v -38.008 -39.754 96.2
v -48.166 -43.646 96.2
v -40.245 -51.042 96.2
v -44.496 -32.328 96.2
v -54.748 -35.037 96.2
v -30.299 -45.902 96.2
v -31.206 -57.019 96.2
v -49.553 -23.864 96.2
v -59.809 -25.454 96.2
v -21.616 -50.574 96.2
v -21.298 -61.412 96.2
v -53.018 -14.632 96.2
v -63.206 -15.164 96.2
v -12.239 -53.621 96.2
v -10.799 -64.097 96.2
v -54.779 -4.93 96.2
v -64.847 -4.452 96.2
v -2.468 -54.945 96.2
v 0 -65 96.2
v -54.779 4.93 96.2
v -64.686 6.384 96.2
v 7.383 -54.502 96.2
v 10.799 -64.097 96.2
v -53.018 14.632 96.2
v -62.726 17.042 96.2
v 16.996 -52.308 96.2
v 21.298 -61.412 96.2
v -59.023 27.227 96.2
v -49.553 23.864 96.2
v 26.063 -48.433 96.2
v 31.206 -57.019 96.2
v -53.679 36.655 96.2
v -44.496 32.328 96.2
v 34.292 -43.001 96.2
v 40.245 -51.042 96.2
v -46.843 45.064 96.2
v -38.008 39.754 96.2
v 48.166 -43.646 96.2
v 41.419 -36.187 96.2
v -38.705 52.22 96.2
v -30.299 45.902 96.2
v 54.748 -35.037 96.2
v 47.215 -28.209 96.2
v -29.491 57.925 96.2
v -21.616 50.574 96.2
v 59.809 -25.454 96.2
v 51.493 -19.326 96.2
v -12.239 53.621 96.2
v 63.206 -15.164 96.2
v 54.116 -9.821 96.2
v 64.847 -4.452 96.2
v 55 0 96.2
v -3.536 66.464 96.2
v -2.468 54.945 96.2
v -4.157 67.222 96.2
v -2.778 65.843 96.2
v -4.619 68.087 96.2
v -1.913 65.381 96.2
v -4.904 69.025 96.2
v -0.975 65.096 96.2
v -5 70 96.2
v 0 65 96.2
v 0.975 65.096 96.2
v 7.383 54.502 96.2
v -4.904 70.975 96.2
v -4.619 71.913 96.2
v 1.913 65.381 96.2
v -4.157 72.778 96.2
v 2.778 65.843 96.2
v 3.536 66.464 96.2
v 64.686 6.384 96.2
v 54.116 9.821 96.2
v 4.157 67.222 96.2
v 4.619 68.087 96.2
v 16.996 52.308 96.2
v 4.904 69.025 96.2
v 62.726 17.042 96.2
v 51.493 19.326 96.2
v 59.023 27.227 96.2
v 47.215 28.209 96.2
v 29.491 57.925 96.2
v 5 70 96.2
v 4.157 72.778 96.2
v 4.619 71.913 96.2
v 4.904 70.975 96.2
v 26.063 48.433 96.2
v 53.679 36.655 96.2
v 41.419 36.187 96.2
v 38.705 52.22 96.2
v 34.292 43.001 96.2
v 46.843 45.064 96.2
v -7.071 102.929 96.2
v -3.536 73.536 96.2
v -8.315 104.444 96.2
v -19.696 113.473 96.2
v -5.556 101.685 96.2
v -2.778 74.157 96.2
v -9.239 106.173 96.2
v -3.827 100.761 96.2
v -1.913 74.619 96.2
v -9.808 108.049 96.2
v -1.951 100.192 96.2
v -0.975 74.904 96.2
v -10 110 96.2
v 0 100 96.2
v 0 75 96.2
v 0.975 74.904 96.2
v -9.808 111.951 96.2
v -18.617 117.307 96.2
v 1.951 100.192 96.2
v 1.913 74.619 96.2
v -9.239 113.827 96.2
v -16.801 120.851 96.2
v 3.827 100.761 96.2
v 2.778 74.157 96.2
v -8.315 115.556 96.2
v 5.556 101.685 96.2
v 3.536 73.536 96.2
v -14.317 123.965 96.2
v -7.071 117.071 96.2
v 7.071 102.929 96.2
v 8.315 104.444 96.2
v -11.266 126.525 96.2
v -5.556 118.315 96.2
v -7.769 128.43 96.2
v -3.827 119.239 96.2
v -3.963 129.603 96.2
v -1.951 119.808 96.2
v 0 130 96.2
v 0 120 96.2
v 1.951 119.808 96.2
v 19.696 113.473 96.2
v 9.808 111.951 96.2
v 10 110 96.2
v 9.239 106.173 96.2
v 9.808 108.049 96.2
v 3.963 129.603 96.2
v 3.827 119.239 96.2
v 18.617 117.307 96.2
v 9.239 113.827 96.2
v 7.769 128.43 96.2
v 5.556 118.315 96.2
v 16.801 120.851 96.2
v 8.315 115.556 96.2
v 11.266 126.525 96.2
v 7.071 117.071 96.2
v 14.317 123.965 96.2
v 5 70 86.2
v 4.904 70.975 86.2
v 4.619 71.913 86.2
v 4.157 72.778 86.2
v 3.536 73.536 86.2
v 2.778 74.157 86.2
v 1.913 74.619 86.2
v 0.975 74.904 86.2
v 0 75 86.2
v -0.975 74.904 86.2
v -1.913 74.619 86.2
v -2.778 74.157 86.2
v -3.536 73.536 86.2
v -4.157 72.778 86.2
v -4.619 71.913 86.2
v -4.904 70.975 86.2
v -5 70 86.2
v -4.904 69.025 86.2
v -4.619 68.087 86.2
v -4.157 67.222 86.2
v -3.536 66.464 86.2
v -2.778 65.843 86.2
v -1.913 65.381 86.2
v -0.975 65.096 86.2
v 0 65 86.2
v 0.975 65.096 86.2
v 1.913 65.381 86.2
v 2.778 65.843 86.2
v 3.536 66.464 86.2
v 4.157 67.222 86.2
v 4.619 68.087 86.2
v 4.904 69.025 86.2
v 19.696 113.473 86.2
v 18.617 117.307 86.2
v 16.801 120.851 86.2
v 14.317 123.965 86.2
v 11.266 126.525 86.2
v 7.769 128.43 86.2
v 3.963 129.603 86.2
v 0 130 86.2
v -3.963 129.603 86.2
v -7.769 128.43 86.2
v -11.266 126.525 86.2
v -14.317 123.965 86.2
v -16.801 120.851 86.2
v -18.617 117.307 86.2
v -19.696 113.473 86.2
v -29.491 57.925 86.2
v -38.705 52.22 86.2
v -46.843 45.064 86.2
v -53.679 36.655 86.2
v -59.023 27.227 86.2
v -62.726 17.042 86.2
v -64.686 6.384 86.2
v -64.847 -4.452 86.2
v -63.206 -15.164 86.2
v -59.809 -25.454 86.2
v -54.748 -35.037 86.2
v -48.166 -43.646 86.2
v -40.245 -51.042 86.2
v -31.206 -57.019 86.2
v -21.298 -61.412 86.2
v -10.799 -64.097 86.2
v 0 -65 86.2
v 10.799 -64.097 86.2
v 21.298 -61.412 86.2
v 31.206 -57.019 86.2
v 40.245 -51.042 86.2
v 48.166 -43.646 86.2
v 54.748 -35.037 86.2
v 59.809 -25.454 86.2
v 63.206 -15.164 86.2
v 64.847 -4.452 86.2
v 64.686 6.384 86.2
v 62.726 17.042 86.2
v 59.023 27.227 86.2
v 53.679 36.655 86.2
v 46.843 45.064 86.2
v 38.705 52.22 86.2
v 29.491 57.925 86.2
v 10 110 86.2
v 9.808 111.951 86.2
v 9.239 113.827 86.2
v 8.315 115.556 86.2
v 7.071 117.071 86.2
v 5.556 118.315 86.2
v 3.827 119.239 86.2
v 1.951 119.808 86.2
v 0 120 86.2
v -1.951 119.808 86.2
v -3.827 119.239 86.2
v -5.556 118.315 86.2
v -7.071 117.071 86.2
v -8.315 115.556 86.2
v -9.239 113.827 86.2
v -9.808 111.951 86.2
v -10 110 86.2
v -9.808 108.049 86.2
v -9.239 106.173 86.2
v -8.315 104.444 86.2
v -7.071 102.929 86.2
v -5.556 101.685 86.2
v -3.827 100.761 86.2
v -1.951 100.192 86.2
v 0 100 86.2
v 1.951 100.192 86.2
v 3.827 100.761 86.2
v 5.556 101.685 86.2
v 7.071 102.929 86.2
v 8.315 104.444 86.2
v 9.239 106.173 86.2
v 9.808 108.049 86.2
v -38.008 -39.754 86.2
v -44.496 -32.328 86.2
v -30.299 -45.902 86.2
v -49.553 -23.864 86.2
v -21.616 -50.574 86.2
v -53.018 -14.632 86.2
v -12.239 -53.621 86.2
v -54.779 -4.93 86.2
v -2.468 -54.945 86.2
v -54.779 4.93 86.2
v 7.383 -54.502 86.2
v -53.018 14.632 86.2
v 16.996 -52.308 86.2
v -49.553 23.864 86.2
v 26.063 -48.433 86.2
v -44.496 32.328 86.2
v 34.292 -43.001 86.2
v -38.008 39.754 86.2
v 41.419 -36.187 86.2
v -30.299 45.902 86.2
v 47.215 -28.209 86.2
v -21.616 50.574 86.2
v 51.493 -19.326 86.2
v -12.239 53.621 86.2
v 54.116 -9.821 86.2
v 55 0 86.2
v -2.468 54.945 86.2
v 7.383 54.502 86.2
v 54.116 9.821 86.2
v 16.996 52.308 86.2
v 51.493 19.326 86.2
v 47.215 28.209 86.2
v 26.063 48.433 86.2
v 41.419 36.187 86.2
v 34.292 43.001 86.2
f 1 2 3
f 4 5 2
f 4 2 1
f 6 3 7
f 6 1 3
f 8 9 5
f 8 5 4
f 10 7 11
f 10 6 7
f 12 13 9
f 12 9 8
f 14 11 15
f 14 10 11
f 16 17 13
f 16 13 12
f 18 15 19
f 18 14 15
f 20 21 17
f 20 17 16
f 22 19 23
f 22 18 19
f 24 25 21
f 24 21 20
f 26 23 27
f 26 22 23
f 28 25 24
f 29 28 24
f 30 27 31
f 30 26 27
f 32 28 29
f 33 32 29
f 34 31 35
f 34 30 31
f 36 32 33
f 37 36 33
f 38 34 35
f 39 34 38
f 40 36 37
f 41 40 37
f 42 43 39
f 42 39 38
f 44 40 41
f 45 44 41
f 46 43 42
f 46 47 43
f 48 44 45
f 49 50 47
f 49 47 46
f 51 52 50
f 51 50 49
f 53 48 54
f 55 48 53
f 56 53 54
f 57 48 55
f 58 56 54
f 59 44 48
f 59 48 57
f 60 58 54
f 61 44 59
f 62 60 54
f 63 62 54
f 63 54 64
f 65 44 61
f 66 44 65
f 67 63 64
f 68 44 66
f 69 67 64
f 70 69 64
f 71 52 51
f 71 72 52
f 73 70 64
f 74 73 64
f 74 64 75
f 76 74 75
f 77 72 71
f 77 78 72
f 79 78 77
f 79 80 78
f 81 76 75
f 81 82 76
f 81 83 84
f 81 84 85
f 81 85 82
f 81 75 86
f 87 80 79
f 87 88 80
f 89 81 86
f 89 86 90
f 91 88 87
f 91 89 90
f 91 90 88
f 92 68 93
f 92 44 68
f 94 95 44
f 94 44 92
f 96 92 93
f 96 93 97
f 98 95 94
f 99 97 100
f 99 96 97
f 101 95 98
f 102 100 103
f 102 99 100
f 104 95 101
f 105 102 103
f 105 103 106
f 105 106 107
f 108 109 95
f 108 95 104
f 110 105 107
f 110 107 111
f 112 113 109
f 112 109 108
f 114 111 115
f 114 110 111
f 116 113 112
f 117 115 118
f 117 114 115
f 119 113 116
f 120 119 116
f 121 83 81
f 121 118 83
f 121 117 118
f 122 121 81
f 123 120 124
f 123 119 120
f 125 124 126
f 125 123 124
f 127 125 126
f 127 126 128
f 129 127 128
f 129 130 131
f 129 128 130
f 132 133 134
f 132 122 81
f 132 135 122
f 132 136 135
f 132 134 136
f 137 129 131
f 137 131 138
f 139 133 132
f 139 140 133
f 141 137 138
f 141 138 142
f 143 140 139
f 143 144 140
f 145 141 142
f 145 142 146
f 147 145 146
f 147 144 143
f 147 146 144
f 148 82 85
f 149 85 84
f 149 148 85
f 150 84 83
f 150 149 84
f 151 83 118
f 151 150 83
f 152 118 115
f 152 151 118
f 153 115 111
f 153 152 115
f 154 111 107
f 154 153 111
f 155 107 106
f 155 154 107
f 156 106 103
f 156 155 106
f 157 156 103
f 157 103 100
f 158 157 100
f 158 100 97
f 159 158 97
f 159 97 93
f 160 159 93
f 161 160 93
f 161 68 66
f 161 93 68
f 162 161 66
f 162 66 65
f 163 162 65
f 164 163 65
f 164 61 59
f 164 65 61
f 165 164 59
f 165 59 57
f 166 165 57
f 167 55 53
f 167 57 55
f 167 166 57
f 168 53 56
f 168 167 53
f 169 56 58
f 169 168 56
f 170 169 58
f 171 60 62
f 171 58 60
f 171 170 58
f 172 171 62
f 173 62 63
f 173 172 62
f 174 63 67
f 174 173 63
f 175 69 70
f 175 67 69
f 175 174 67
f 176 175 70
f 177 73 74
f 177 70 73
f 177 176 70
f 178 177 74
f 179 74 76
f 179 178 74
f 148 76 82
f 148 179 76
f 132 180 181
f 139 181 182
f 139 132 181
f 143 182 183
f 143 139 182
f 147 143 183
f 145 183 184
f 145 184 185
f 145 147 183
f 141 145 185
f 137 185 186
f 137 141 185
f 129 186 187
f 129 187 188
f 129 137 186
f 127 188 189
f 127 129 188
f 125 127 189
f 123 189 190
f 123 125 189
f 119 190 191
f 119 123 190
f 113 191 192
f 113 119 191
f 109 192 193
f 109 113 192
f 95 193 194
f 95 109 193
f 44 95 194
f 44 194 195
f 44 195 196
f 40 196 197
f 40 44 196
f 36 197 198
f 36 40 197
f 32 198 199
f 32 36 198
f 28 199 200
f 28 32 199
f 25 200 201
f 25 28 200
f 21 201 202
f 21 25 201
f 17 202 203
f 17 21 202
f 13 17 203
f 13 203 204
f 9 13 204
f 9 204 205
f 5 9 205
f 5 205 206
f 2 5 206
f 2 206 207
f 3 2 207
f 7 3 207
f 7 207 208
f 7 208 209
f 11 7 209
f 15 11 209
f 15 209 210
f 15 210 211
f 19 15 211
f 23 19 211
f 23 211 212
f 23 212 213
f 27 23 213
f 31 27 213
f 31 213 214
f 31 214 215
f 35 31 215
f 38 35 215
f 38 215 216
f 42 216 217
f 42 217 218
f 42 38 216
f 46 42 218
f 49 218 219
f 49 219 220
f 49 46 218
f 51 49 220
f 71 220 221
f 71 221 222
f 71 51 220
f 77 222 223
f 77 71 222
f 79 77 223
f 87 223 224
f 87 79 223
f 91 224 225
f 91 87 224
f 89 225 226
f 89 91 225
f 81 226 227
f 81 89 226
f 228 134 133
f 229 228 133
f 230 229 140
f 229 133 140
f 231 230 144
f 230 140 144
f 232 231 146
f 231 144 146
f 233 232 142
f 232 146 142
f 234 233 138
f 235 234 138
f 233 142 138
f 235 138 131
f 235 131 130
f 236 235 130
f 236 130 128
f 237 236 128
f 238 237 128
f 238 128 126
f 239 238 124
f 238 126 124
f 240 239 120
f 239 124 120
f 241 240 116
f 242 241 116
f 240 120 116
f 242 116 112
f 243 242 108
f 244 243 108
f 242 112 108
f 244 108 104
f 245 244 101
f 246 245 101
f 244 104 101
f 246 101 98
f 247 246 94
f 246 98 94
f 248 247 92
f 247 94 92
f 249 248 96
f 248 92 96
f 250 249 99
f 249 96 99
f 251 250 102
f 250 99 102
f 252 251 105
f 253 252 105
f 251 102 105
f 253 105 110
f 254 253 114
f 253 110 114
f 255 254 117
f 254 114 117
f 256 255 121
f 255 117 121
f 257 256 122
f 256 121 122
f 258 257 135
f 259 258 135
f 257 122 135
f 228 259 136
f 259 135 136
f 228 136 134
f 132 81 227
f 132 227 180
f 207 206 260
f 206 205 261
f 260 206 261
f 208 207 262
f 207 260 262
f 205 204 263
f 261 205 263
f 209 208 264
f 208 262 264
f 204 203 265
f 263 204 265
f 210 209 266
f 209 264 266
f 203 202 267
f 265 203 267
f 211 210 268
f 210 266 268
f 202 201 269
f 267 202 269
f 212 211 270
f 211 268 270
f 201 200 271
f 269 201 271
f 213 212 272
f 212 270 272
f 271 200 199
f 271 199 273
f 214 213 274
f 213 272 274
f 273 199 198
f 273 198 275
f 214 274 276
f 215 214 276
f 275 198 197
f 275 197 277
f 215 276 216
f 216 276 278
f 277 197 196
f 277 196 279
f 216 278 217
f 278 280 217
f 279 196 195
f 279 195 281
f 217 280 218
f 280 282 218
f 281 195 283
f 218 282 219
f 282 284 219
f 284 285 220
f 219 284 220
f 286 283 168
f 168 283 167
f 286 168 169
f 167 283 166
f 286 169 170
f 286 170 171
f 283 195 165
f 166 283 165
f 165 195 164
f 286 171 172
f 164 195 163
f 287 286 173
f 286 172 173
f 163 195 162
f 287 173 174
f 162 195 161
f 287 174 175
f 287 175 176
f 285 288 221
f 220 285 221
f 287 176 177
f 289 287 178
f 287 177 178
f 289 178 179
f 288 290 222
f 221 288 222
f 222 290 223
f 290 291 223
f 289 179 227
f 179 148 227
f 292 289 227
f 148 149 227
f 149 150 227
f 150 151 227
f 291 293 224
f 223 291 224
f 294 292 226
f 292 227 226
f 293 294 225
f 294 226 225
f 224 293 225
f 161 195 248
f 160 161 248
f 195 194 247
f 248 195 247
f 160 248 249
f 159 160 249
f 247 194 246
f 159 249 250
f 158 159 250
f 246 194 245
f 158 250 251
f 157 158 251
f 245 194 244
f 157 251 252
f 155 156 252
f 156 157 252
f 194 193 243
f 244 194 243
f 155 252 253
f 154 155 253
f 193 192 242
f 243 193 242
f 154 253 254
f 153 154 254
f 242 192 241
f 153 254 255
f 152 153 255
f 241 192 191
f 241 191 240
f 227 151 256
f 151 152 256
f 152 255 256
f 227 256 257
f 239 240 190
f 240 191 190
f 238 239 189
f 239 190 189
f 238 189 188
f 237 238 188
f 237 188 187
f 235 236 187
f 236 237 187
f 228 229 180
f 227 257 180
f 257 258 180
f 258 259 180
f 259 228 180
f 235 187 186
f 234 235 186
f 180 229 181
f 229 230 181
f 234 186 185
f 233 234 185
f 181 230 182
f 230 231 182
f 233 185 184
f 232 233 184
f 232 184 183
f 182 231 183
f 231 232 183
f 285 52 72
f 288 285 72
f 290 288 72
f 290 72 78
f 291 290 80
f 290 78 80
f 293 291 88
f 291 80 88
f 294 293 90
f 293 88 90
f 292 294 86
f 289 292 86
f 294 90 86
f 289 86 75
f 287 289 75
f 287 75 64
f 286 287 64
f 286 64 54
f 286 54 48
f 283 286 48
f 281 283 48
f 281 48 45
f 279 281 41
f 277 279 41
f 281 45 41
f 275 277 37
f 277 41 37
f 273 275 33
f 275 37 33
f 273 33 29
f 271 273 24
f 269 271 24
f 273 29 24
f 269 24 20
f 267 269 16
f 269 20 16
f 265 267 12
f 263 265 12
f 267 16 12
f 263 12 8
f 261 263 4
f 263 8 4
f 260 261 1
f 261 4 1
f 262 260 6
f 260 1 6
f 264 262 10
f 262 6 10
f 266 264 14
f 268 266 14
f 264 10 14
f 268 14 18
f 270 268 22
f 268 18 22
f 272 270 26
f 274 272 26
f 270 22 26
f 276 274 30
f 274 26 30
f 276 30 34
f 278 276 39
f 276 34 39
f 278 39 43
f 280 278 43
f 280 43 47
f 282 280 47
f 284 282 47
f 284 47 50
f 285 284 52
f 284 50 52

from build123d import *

# Parameters (mm, degrees)
SKETCH2_R           = 5
BOSS_EXTRUDE1_DEPTH = 10
SKETCH3_R           = 10
SKETCH3_R_2         = 5
BOSS_EXTRUDE2_DEPTH = 76.2
BOSS_EXTRUDE3_START = 86.2
SKETCH2_2_R         = 5
BOSS_EXTRUDE3_DEPTH = 10
SKETCH5_R           = 65
BOSS_EXTRUDE4_DEPTH = 10
SKETCH6_R           = 55
CUT_EXTRUDE1_DEPTH  = 10
SKETCH7_R           = 80
CUT_EXTRUDE2_DEPTH  = 135.370532484
SKETCH8_R           = 10
BOSS_EXTRUDE6_DEPTH = 10


with BuildPart() as part:
    # Sketch2 → Boss-Extrude1 (new body)
    with BuildSketch(Plane.XY):
        with BuildLine():
            Line((-19.794866372, 2.857142857), (-9.897433186, 71.428571429))
            ThreePointArc((-9.897433186, 71.428571429), (0, 80), (9.897433186, 71.428571429))
            Line((9.897433186, 71.428571429), (19.794866372, 2.857142857))
            ThreePointArc((19.794866372, 2.857142857), (0, -20), (-19.794866372, 2.857142857))
        make_face()
        with Locations((0, 70)):
            Circle(SKETCH2_R, mode=Mode.SUBTRACT)
        with BuildLine():
            Line((-2.5, 9.682458366), (-2.5, 12))
            Line((-2.5, 12), (2.5, 12))
            Line((2.5, 12), (2.5, 9.682458366))
            ThreePointArc((2.5, 9.682458366), (0, -10), (-2.5, 9.682458366))
        make_face(mode=Mode.SUBTRACT)
    extrude(amount=BOSS_EXTRUDE1_DEPTH)

    # Sketch3 → Boss-Extrude2 (add)
    with BuildSketch(Plane.XY.offset(10)):
        with Locations(Location((0, 70, 0), (0, 0, 171.786789298))):
            Circle(SKETCH3_R)
        with Locations((0, 70)):
            Circle(SKETCH3_R_2, mode=Mode.SUBTRACT)
    extrude(amount=BOSS_EXTRUDE2_DEPTH)

    # Sketch2<2> → Boss-Extrude3 (add)
    with BuildSketch(Plane.XY.offset(BOSS_EXTRUDE3_START)):
        with BuildLine():
            Line((-19.794866372, 2.857142857), (-9.897433186, 71.428571429))
            ThreePointArc((-9.897433186, 71.428571429), (0, 80), (9.897433186, 71.428571429))
            Line((9.897433186, 71.428571429), (19.794866372, 2.857142857))
            ThreePointArc((19.794866372, 2.857142857), (0, -20), (-19.794866372, 2.857142857))
        make_face()
        with Locations((0, 70)):
            Circle(SKETCH2_2_R, mode=Mode.SUBTRACT)
        with BuildLine():
            Line((-2.5, 9.682458366), (-2.5, 12))
            Line((-2.5, 12), (2.5, 12))
            Line((2.5, 12), (2.5, 9.682458366))
            ThreePointArc((2.5, 9.682458366), (0, -10), (-2.5, 9.682458366))
        make_face(mode=Mode.SUBTRACT)
    extrude(amount=BOSS_EXTRUDE3_DEPTH)

    # Sketch5 → Boss-Extrude4 (add)
    with BuildSketch(Plane.XY.offset(96.2)):
        Circle(SKETCH5_R)
    extrude(amount=-BOSS_EXTRUDE4_DEPTH)

    # Sketch6 → Cut-Extrude1 (cut)
    with BuildSketch(Plane.XY.offset(96.2)):
        Circle(SKETCH6_R)
    extrude(amount=-CUT_EXTRUDE1_DEPTH, mode=Mode.SUBTRACT)

    # Sketch7 → Cut-Extrude2 (cut, through all)
    with BuildSketch(Plane(origin=(0, 0, 86.2), x_dir=(-1, 0, 0), z_dir=(0, 0, -1))):
        Circle(SKETCH7_R)
    extrude(amount=CUT_EXTRUDE2_DEPTH, mode=Mode.SUBTRACT)

    # Sketch8 → Boss-Extrude6 (add)
    with BuildSketch(Plane.XY.offset(96.2)):
        with BuildLine():
            Line((-19.69615506, 113.472963553), (-29.490777376, 57.924900084))
            ThreePointArc((-29.490777376, 57.924900084), (-20.457217444, 61.696857736), (-10.959640032, 64.06938653))
            Line((-10.959640032, 64.06938653), (-9.897433186, 71.428571429))
            ThreePointArc((-9.897433186, 71.428571429), (0, 80), (9.897433186, 71.428571429))
            Line((9.897433186, 71.428571429), (10.959640032, 64.06938653))
            ThreePointArc((10.959640032, 64.06938653), (20.457217444, 61.696857736), (29.490777376, 57.924900084))
            Line((29.490777376, 57.924900084), (19.69615506, 113.472963553))
            ThreePointArc((19.69615506, 113.472963553), (0, 130), (-19.69615506, 113.472963553))
        make_face()
        with Locations((0, 110)):
            Circle(SKETCH8_R, mode=Mode.SUBTRACT)
    extrude(amount=-BOSS_EXTRUDE6_DEPTH)


solid = part.part
